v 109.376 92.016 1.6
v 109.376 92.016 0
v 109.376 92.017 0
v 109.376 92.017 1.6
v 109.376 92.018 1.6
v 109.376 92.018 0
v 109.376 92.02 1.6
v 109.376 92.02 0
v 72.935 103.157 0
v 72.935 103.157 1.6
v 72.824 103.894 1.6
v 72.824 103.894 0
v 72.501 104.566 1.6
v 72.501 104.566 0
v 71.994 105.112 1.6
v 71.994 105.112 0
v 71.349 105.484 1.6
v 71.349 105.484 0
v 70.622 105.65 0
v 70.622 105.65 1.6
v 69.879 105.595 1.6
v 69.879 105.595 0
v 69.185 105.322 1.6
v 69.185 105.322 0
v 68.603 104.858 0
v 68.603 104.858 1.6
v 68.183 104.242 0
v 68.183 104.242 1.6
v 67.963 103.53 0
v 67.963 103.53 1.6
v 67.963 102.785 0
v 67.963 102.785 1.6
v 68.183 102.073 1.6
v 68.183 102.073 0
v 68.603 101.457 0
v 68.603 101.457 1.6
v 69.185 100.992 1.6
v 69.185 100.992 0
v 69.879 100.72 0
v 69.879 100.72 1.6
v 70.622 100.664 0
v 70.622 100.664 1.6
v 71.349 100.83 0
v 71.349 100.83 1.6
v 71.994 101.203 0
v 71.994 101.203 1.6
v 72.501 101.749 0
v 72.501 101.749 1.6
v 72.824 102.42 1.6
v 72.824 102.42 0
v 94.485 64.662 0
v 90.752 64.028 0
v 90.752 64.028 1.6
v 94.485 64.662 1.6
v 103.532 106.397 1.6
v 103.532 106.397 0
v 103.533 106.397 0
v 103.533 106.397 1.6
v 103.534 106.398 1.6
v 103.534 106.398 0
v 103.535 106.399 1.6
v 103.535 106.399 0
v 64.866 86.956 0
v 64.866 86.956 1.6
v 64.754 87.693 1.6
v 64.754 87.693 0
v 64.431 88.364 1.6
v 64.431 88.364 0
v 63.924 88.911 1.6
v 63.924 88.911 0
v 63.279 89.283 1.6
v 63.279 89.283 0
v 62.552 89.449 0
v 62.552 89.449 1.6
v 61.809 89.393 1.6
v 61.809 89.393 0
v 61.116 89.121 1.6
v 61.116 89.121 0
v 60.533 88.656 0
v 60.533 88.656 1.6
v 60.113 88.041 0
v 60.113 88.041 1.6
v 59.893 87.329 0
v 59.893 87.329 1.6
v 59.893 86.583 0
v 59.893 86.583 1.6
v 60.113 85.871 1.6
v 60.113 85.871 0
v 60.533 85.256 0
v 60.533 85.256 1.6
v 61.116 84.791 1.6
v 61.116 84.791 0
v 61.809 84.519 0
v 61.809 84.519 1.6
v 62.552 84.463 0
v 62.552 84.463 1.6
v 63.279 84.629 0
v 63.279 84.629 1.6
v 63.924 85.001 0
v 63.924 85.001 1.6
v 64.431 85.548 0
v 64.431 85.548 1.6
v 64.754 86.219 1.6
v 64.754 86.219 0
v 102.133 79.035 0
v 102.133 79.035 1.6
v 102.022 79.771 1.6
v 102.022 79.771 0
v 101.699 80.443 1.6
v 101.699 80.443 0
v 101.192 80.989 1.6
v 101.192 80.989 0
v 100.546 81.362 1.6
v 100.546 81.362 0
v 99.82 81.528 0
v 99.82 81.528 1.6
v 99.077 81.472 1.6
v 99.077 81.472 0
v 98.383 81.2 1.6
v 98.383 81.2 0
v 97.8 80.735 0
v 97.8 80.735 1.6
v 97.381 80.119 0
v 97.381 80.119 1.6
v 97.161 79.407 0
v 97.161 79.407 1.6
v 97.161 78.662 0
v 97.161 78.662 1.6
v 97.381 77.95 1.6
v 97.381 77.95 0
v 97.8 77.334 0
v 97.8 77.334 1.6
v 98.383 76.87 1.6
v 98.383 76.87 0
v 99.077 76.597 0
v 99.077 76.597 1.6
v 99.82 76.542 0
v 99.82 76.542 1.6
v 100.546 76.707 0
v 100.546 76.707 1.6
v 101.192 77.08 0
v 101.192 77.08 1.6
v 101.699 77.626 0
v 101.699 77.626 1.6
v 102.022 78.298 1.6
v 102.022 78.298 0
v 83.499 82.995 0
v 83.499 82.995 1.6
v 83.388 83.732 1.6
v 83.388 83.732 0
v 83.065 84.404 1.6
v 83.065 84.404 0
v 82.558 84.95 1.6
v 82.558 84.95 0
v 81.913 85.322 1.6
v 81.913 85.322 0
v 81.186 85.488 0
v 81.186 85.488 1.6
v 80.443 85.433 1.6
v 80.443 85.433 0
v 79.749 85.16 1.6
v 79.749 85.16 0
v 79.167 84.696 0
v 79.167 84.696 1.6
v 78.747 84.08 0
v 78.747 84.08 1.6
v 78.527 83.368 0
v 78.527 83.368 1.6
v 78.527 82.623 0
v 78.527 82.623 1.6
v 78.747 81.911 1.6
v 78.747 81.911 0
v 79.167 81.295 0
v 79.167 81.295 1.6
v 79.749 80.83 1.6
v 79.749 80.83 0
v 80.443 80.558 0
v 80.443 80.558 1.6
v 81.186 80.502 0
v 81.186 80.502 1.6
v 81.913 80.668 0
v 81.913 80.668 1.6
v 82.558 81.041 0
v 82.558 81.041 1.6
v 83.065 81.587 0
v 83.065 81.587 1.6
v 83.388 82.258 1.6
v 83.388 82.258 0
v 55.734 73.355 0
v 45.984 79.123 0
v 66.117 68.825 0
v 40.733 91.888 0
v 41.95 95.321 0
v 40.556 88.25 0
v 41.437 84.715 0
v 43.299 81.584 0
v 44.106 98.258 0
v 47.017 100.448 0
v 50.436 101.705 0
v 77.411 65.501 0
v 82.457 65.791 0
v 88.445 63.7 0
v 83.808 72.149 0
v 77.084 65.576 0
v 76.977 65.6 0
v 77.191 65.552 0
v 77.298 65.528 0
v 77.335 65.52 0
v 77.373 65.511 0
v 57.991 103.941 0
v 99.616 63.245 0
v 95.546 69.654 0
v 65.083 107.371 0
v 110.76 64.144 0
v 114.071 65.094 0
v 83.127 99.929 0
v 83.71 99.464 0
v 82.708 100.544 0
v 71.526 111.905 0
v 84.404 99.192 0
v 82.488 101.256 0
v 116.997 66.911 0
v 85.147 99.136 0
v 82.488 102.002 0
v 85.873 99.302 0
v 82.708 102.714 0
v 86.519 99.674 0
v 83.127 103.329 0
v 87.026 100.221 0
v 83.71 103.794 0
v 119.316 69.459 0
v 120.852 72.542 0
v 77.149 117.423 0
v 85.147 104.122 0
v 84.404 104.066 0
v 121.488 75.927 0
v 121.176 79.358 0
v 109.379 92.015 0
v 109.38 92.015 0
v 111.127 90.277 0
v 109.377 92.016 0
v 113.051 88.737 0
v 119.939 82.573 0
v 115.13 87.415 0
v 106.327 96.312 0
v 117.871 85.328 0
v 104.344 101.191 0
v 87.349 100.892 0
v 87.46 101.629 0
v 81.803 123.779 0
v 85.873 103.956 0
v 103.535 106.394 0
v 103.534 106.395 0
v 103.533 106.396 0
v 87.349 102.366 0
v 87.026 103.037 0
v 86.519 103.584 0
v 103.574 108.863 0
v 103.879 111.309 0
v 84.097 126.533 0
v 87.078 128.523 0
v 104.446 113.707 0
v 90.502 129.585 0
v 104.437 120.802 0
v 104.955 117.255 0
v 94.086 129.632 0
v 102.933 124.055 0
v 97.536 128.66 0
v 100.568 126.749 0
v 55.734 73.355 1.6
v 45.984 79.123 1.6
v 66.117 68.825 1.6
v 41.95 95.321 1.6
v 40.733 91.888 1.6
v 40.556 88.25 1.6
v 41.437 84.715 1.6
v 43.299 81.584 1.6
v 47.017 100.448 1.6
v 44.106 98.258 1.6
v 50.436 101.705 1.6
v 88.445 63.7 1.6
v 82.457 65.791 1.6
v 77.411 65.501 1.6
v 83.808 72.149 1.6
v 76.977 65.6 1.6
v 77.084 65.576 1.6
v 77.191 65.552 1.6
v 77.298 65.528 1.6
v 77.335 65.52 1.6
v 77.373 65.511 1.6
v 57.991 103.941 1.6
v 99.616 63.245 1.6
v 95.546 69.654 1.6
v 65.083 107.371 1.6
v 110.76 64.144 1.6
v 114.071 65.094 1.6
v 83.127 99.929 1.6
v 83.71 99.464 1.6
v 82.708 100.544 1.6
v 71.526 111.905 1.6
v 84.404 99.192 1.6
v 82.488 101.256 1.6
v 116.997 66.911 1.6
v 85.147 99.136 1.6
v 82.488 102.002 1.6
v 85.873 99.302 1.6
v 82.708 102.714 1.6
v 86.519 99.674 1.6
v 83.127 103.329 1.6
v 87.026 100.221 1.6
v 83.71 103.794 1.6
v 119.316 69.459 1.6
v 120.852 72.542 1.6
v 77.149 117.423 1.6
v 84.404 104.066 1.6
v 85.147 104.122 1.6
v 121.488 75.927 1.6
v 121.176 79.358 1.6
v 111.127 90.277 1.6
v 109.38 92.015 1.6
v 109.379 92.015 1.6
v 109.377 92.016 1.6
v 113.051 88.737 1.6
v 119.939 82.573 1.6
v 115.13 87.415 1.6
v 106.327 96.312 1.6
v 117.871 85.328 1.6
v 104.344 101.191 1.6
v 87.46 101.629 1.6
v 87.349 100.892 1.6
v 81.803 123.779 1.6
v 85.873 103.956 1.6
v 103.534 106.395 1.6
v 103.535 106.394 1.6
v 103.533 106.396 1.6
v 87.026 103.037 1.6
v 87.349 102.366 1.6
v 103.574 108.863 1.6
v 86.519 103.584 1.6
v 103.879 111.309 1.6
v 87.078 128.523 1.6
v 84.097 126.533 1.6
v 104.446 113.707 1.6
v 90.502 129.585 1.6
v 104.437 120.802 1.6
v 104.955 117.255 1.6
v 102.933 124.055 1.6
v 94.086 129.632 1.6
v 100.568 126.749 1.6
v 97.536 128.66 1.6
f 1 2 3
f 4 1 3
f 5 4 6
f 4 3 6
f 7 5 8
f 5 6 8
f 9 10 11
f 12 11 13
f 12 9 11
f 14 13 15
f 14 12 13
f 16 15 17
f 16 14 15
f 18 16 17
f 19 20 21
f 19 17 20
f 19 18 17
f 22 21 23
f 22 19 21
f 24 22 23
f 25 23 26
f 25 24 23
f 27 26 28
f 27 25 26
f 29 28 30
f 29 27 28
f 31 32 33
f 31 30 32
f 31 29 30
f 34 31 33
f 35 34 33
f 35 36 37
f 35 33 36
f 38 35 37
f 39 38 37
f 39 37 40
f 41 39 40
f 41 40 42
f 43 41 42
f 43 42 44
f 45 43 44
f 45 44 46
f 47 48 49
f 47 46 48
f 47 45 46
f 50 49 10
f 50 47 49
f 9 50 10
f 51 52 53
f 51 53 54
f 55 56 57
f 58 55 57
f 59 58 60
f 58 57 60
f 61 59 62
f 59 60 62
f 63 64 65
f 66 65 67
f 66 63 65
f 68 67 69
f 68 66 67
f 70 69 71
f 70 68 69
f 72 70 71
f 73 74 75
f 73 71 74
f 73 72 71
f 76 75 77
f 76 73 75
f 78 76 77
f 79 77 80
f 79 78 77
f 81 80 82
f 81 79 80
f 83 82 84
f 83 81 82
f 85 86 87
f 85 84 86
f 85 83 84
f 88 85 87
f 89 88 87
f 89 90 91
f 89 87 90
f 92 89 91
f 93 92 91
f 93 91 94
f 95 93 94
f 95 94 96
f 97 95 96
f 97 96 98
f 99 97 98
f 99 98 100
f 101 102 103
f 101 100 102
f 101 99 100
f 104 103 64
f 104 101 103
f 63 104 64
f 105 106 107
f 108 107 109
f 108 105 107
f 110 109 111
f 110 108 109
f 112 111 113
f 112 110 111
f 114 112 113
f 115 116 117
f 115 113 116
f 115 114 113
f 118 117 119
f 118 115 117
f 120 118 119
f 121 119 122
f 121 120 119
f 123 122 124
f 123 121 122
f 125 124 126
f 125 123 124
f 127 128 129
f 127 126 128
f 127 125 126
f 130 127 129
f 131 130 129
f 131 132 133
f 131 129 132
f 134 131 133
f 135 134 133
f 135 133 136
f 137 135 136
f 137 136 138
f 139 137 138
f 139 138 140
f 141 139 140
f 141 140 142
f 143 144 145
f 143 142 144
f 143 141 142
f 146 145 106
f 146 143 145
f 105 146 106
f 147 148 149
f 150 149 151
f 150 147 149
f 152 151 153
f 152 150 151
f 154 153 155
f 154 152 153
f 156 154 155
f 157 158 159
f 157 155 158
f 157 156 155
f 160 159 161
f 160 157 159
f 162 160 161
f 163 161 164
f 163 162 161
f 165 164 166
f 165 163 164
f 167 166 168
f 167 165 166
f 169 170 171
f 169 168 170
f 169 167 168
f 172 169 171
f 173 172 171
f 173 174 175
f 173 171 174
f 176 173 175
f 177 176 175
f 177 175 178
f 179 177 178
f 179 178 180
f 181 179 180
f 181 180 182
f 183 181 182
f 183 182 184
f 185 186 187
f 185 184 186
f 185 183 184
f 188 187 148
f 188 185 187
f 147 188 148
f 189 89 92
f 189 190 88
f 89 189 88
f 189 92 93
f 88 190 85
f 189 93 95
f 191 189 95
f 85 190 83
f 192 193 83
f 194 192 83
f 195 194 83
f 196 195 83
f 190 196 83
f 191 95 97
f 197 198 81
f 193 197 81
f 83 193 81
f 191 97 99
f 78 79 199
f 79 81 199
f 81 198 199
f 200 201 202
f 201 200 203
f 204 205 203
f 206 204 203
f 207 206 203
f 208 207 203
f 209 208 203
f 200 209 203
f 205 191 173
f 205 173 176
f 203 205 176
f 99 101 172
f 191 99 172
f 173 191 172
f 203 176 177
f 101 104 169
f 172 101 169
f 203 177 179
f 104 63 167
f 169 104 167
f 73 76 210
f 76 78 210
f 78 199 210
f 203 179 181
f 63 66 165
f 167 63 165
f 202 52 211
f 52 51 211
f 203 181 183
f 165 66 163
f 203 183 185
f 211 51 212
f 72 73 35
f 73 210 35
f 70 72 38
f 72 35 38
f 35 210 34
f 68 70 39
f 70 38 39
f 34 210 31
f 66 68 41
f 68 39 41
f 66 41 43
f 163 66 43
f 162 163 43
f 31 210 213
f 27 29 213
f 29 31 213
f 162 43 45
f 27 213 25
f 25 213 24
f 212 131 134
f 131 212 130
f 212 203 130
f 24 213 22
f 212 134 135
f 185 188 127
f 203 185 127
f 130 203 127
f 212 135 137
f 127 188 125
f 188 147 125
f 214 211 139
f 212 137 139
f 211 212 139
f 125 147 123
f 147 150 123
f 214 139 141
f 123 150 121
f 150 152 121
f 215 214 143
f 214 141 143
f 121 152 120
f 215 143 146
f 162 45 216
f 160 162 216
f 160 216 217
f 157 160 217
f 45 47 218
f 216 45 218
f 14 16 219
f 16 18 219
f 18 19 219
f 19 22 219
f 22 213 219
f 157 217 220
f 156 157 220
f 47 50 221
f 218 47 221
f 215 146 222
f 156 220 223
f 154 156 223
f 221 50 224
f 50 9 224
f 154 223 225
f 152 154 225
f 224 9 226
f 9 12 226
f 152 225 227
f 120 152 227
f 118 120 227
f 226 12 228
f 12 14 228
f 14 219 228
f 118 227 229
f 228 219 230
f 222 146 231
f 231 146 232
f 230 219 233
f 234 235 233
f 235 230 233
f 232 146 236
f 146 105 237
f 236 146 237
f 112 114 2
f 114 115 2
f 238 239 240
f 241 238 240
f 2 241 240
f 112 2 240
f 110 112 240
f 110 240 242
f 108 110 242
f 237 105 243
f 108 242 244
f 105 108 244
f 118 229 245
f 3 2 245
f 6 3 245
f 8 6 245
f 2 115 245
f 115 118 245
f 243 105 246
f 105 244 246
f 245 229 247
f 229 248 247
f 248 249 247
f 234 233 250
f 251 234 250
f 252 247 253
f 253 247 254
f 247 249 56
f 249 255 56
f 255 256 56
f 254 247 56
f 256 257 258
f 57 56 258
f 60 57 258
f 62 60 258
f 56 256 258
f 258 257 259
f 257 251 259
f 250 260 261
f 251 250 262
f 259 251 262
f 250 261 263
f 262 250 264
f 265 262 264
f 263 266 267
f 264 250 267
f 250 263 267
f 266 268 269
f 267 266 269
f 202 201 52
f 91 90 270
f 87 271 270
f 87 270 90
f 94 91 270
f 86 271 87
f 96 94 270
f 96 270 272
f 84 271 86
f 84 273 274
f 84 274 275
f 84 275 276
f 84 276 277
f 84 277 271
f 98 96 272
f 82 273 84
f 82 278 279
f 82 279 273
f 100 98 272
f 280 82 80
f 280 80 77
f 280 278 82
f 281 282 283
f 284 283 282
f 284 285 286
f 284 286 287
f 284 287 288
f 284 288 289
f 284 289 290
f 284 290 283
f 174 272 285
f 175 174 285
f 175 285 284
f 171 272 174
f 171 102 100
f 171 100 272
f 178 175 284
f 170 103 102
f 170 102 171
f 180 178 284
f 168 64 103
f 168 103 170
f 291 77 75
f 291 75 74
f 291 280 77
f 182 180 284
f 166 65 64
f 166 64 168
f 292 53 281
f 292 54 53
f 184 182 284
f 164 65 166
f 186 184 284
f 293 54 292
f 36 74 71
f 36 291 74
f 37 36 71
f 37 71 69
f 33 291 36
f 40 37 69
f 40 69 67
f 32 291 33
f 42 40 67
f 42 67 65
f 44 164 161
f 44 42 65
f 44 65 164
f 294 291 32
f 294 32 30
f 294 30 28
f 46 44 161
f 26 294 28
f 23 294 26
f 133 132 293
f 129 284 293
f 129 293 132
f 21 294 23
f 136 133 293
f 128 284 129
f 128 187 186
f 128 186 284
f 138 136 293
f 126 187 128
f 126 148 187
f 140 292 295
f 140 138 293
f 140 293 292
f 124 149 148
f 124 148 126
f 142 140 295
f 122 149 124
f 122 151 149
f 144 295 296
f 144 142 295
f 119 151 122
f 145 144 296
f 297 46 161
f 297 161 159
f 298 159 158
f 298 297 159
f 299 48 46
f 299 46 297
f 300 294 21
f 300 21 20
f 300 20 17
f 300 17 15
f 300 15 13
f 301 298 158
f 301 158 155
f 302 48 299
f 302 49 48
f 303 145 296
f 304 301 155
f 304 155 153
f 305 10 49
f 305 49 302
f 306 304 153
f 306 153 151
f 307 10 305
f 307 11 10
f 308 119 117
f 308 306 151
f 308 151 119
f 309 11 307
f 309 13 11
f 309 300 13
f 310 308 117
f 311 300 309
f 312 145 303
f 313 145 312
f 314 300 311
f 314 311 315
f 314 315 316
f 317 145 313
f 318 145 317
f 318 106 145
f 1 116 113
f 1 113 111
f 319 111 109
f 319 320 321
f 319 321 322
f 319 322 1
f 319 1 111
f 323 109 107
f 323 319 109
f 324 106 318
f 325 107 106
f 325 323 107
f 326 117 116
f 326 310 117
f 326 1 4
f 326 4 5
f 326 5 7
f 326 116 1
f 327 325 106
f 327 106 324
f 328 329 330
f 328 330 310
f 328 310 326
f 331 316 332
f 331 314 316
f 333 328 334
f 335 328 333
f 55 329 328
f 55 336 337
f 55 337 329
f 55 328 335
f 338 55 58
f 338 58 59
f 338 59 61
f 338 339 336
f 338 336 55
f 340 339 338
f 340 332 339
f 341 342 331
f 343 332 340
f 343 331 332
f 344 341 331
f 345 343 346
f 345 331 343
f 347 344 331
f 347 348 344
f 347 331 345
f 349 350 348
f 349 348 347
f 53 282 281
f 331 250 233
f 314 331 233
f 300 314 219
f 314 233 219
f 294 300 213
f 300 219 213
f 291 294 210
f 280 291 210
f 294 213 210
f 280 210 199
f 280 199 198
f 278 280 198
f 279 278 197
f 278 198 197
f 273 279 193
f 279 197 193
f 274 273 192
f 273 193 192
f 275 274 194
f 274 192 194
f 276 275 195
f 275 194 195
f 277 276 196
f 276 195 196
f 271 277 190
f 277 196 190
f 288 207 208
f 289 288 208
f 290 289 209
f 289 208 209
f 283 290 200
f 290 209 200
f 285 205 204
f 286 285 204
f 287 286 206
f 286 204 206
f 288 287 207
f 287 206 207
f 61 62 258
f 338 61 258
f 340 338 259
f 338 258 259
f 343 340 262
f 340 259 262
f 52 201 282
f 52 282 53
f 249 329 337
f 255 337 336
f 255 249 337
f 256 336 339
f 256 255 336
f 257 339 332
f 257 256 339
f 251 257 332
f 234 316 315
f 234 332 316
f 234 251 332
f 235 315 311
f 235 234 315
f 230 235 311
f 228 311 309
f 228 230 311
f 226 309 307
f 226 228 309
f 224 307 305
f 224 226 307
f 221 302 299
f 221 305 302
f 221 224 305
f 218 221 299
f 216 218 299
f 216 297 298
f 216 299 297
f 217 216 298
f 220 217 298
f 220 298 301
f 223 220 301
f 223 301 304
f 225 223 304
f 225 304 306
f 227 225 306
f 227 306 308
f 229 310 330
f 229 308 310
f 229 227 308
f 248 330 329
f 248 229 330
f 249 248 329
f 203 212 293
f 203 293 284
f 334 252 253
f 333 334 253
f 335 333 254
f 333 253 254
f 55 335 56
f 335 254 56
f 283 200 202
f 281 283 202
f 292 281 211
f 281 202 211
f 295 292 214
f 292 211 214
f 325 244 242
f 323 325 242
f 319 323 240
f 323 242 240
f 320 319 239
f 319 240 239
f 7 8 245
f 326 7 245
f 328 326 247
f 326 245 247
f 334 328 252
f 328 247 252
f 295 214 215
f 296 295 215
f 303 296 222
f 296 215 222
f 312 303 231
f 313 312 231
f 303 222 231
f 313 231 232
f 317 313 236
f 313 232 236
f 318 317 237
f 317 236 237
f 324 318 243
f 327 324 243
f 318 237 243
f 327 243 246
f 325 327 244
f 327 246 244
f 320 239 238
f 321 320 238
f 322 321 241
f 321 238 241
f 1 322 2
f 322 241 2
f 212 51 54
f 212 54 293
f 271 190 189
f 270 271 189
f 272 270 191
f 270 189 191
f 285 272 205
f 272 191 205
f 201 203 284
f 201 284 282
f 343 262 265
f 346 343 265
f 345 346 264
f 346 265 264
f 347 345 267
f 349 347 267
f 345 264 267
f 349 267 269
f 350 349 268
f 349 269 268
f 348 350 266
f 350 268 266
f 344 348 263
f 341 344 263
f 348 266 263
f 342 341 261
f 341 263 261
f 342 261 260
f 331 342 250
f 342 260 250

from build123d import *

# Parameters (mm, degrees)
BOSS_EXTRUDE1_DEPTH = 1.6
SKETCH8_3_R         = 2.5
CUT_EXTRUDE1_DEPTH  = 178.756608161
SKETCH25_R          = 2.5
CUT_EXTRUDE2_DEPTH  = 178.756608161
CUT_EXTRUDE3_DEPTH  = 175.275284078


with BuildPart() as part:
    # Sketch8 → Boss-Extrude1 (new body)
    with BuildSketch(Plane.XY):
        with BuildLine():
            ThreePointArc((103.534701401, 106.398987898), (103.693161759, 110.090138371), (104.446158593, 113.707139515))
            ThreePointArc((104.446158593, 113.707139515), (97.535722451, 128.659745128), (81.803110207, 123.779227301))
            ThreePointArc((81.803110207, 123.779227301), (68.396685685, 109.506582784), (50.436082024, 101.705472858))
            ThreePointArc((50.436082024, 101.705472858), (40.732585656, 91.888172428), (45.984244445, 79.122699094))
            ThreePointArc((45.984244445, 79.122699094), (60.856228216, 70.93053968), (76.976923111, 65.600382715))
            ThreePointArc((76.976923111, 65.600382715), (77.137220348, 65.563882378), (77.2977589, 65.528458486))
            ThreePointArc((77.2977589, 65.528458486), (77.354298773, 65.515492739), (77.410522602, 65.501218676))
            ThreePointArc((77.410522602, 65.501218676), (94.023303804, 63.303193357), (110.759742778, 64.144278965))
            ThreePointArc((110.759742778, 64.144278965), (121.287127646, 74.212620667), (115.130462452, 87.414620912))
            ThreePointArc((115.130462452, 87.414620912), (112.067901623, 89.481121015), (109.379631064, 92.015465685))
            ThreePointArc((109.379631064, 92.015465685), (109.377986421, 92.015505684), (109.376341775, 92.015545509))
            ThreePointArc((109.376341775, 92.015545509), (109.37615287, 92.017539878), (109.375963817, 92.019534234))
            ThreePointArc((109.375963817, 92.019534234), (105.194093866, 98.693961054), (103.534911629, 106.393514545))
            ThreePointArc((103.534911629, 106.393514545), (103.533655951, 106.395075463), (103.532400156, 106.396636288))
            ThreePointArc((103.532400156, 106.396636288), (103.533550841, 106.397812032), (103.534701401, 106.398987898))
        make_face()
    extrude(amount=BOSS_EXTRUDE1_DEPTH)

    # Sketch8<3> → Cut-Extrude1 (cut, through all)
    with BuildSketch(Plane.XY):
        with Locations((70.435309654, 103.157249982)):
            Circle(SKETCH8_3_R)
    extrude(amount=CUT_EXTRUDE1_DEPTH, mode=Mode.SUBTRACT)

    # Sketch25 → Cut-Extrude2 (cut, through all)
    with BuildSketch(Plane.XY):
        with Locations((84.959968883, 101.629007764)):
            Circle(SKETCH25_R)
        with Locations((62.365539379, 86.956013681)):
            Circle(SKETCH25_R)
        with Locations((80.999251173, 82.99529597)):
            Circle(SKETCH25_R)
        with Locations((99.632962967, 79.03457826)):
            Circle(SKETCH25_R)
    extrude(amount=CUT_EXTRUDE2_DEPTH, mode=Mode.SUBTRACT)

    # Sketch23 → Cut-Extrude3 (cut, through all)
    with BuildSketch(Plane(origin=(-19.097367964, 26.776820286, 0), x_dir=(0.9781476007338056, -0.2079116908177598, 0), z_dir=(0, 0, 1))):
        Polygon((103.223291241, 65.776224437), (91.223291241, 65.776224437), (91.223291241, 59.276224437), (99.703476733, 59.276224437), (103.223291241, 60.67197249), align=None)
    extrude(amount=CUT_EXTRUDE3_DEPTH, mode=Mode.SUBTRACT)


solid = part.part
